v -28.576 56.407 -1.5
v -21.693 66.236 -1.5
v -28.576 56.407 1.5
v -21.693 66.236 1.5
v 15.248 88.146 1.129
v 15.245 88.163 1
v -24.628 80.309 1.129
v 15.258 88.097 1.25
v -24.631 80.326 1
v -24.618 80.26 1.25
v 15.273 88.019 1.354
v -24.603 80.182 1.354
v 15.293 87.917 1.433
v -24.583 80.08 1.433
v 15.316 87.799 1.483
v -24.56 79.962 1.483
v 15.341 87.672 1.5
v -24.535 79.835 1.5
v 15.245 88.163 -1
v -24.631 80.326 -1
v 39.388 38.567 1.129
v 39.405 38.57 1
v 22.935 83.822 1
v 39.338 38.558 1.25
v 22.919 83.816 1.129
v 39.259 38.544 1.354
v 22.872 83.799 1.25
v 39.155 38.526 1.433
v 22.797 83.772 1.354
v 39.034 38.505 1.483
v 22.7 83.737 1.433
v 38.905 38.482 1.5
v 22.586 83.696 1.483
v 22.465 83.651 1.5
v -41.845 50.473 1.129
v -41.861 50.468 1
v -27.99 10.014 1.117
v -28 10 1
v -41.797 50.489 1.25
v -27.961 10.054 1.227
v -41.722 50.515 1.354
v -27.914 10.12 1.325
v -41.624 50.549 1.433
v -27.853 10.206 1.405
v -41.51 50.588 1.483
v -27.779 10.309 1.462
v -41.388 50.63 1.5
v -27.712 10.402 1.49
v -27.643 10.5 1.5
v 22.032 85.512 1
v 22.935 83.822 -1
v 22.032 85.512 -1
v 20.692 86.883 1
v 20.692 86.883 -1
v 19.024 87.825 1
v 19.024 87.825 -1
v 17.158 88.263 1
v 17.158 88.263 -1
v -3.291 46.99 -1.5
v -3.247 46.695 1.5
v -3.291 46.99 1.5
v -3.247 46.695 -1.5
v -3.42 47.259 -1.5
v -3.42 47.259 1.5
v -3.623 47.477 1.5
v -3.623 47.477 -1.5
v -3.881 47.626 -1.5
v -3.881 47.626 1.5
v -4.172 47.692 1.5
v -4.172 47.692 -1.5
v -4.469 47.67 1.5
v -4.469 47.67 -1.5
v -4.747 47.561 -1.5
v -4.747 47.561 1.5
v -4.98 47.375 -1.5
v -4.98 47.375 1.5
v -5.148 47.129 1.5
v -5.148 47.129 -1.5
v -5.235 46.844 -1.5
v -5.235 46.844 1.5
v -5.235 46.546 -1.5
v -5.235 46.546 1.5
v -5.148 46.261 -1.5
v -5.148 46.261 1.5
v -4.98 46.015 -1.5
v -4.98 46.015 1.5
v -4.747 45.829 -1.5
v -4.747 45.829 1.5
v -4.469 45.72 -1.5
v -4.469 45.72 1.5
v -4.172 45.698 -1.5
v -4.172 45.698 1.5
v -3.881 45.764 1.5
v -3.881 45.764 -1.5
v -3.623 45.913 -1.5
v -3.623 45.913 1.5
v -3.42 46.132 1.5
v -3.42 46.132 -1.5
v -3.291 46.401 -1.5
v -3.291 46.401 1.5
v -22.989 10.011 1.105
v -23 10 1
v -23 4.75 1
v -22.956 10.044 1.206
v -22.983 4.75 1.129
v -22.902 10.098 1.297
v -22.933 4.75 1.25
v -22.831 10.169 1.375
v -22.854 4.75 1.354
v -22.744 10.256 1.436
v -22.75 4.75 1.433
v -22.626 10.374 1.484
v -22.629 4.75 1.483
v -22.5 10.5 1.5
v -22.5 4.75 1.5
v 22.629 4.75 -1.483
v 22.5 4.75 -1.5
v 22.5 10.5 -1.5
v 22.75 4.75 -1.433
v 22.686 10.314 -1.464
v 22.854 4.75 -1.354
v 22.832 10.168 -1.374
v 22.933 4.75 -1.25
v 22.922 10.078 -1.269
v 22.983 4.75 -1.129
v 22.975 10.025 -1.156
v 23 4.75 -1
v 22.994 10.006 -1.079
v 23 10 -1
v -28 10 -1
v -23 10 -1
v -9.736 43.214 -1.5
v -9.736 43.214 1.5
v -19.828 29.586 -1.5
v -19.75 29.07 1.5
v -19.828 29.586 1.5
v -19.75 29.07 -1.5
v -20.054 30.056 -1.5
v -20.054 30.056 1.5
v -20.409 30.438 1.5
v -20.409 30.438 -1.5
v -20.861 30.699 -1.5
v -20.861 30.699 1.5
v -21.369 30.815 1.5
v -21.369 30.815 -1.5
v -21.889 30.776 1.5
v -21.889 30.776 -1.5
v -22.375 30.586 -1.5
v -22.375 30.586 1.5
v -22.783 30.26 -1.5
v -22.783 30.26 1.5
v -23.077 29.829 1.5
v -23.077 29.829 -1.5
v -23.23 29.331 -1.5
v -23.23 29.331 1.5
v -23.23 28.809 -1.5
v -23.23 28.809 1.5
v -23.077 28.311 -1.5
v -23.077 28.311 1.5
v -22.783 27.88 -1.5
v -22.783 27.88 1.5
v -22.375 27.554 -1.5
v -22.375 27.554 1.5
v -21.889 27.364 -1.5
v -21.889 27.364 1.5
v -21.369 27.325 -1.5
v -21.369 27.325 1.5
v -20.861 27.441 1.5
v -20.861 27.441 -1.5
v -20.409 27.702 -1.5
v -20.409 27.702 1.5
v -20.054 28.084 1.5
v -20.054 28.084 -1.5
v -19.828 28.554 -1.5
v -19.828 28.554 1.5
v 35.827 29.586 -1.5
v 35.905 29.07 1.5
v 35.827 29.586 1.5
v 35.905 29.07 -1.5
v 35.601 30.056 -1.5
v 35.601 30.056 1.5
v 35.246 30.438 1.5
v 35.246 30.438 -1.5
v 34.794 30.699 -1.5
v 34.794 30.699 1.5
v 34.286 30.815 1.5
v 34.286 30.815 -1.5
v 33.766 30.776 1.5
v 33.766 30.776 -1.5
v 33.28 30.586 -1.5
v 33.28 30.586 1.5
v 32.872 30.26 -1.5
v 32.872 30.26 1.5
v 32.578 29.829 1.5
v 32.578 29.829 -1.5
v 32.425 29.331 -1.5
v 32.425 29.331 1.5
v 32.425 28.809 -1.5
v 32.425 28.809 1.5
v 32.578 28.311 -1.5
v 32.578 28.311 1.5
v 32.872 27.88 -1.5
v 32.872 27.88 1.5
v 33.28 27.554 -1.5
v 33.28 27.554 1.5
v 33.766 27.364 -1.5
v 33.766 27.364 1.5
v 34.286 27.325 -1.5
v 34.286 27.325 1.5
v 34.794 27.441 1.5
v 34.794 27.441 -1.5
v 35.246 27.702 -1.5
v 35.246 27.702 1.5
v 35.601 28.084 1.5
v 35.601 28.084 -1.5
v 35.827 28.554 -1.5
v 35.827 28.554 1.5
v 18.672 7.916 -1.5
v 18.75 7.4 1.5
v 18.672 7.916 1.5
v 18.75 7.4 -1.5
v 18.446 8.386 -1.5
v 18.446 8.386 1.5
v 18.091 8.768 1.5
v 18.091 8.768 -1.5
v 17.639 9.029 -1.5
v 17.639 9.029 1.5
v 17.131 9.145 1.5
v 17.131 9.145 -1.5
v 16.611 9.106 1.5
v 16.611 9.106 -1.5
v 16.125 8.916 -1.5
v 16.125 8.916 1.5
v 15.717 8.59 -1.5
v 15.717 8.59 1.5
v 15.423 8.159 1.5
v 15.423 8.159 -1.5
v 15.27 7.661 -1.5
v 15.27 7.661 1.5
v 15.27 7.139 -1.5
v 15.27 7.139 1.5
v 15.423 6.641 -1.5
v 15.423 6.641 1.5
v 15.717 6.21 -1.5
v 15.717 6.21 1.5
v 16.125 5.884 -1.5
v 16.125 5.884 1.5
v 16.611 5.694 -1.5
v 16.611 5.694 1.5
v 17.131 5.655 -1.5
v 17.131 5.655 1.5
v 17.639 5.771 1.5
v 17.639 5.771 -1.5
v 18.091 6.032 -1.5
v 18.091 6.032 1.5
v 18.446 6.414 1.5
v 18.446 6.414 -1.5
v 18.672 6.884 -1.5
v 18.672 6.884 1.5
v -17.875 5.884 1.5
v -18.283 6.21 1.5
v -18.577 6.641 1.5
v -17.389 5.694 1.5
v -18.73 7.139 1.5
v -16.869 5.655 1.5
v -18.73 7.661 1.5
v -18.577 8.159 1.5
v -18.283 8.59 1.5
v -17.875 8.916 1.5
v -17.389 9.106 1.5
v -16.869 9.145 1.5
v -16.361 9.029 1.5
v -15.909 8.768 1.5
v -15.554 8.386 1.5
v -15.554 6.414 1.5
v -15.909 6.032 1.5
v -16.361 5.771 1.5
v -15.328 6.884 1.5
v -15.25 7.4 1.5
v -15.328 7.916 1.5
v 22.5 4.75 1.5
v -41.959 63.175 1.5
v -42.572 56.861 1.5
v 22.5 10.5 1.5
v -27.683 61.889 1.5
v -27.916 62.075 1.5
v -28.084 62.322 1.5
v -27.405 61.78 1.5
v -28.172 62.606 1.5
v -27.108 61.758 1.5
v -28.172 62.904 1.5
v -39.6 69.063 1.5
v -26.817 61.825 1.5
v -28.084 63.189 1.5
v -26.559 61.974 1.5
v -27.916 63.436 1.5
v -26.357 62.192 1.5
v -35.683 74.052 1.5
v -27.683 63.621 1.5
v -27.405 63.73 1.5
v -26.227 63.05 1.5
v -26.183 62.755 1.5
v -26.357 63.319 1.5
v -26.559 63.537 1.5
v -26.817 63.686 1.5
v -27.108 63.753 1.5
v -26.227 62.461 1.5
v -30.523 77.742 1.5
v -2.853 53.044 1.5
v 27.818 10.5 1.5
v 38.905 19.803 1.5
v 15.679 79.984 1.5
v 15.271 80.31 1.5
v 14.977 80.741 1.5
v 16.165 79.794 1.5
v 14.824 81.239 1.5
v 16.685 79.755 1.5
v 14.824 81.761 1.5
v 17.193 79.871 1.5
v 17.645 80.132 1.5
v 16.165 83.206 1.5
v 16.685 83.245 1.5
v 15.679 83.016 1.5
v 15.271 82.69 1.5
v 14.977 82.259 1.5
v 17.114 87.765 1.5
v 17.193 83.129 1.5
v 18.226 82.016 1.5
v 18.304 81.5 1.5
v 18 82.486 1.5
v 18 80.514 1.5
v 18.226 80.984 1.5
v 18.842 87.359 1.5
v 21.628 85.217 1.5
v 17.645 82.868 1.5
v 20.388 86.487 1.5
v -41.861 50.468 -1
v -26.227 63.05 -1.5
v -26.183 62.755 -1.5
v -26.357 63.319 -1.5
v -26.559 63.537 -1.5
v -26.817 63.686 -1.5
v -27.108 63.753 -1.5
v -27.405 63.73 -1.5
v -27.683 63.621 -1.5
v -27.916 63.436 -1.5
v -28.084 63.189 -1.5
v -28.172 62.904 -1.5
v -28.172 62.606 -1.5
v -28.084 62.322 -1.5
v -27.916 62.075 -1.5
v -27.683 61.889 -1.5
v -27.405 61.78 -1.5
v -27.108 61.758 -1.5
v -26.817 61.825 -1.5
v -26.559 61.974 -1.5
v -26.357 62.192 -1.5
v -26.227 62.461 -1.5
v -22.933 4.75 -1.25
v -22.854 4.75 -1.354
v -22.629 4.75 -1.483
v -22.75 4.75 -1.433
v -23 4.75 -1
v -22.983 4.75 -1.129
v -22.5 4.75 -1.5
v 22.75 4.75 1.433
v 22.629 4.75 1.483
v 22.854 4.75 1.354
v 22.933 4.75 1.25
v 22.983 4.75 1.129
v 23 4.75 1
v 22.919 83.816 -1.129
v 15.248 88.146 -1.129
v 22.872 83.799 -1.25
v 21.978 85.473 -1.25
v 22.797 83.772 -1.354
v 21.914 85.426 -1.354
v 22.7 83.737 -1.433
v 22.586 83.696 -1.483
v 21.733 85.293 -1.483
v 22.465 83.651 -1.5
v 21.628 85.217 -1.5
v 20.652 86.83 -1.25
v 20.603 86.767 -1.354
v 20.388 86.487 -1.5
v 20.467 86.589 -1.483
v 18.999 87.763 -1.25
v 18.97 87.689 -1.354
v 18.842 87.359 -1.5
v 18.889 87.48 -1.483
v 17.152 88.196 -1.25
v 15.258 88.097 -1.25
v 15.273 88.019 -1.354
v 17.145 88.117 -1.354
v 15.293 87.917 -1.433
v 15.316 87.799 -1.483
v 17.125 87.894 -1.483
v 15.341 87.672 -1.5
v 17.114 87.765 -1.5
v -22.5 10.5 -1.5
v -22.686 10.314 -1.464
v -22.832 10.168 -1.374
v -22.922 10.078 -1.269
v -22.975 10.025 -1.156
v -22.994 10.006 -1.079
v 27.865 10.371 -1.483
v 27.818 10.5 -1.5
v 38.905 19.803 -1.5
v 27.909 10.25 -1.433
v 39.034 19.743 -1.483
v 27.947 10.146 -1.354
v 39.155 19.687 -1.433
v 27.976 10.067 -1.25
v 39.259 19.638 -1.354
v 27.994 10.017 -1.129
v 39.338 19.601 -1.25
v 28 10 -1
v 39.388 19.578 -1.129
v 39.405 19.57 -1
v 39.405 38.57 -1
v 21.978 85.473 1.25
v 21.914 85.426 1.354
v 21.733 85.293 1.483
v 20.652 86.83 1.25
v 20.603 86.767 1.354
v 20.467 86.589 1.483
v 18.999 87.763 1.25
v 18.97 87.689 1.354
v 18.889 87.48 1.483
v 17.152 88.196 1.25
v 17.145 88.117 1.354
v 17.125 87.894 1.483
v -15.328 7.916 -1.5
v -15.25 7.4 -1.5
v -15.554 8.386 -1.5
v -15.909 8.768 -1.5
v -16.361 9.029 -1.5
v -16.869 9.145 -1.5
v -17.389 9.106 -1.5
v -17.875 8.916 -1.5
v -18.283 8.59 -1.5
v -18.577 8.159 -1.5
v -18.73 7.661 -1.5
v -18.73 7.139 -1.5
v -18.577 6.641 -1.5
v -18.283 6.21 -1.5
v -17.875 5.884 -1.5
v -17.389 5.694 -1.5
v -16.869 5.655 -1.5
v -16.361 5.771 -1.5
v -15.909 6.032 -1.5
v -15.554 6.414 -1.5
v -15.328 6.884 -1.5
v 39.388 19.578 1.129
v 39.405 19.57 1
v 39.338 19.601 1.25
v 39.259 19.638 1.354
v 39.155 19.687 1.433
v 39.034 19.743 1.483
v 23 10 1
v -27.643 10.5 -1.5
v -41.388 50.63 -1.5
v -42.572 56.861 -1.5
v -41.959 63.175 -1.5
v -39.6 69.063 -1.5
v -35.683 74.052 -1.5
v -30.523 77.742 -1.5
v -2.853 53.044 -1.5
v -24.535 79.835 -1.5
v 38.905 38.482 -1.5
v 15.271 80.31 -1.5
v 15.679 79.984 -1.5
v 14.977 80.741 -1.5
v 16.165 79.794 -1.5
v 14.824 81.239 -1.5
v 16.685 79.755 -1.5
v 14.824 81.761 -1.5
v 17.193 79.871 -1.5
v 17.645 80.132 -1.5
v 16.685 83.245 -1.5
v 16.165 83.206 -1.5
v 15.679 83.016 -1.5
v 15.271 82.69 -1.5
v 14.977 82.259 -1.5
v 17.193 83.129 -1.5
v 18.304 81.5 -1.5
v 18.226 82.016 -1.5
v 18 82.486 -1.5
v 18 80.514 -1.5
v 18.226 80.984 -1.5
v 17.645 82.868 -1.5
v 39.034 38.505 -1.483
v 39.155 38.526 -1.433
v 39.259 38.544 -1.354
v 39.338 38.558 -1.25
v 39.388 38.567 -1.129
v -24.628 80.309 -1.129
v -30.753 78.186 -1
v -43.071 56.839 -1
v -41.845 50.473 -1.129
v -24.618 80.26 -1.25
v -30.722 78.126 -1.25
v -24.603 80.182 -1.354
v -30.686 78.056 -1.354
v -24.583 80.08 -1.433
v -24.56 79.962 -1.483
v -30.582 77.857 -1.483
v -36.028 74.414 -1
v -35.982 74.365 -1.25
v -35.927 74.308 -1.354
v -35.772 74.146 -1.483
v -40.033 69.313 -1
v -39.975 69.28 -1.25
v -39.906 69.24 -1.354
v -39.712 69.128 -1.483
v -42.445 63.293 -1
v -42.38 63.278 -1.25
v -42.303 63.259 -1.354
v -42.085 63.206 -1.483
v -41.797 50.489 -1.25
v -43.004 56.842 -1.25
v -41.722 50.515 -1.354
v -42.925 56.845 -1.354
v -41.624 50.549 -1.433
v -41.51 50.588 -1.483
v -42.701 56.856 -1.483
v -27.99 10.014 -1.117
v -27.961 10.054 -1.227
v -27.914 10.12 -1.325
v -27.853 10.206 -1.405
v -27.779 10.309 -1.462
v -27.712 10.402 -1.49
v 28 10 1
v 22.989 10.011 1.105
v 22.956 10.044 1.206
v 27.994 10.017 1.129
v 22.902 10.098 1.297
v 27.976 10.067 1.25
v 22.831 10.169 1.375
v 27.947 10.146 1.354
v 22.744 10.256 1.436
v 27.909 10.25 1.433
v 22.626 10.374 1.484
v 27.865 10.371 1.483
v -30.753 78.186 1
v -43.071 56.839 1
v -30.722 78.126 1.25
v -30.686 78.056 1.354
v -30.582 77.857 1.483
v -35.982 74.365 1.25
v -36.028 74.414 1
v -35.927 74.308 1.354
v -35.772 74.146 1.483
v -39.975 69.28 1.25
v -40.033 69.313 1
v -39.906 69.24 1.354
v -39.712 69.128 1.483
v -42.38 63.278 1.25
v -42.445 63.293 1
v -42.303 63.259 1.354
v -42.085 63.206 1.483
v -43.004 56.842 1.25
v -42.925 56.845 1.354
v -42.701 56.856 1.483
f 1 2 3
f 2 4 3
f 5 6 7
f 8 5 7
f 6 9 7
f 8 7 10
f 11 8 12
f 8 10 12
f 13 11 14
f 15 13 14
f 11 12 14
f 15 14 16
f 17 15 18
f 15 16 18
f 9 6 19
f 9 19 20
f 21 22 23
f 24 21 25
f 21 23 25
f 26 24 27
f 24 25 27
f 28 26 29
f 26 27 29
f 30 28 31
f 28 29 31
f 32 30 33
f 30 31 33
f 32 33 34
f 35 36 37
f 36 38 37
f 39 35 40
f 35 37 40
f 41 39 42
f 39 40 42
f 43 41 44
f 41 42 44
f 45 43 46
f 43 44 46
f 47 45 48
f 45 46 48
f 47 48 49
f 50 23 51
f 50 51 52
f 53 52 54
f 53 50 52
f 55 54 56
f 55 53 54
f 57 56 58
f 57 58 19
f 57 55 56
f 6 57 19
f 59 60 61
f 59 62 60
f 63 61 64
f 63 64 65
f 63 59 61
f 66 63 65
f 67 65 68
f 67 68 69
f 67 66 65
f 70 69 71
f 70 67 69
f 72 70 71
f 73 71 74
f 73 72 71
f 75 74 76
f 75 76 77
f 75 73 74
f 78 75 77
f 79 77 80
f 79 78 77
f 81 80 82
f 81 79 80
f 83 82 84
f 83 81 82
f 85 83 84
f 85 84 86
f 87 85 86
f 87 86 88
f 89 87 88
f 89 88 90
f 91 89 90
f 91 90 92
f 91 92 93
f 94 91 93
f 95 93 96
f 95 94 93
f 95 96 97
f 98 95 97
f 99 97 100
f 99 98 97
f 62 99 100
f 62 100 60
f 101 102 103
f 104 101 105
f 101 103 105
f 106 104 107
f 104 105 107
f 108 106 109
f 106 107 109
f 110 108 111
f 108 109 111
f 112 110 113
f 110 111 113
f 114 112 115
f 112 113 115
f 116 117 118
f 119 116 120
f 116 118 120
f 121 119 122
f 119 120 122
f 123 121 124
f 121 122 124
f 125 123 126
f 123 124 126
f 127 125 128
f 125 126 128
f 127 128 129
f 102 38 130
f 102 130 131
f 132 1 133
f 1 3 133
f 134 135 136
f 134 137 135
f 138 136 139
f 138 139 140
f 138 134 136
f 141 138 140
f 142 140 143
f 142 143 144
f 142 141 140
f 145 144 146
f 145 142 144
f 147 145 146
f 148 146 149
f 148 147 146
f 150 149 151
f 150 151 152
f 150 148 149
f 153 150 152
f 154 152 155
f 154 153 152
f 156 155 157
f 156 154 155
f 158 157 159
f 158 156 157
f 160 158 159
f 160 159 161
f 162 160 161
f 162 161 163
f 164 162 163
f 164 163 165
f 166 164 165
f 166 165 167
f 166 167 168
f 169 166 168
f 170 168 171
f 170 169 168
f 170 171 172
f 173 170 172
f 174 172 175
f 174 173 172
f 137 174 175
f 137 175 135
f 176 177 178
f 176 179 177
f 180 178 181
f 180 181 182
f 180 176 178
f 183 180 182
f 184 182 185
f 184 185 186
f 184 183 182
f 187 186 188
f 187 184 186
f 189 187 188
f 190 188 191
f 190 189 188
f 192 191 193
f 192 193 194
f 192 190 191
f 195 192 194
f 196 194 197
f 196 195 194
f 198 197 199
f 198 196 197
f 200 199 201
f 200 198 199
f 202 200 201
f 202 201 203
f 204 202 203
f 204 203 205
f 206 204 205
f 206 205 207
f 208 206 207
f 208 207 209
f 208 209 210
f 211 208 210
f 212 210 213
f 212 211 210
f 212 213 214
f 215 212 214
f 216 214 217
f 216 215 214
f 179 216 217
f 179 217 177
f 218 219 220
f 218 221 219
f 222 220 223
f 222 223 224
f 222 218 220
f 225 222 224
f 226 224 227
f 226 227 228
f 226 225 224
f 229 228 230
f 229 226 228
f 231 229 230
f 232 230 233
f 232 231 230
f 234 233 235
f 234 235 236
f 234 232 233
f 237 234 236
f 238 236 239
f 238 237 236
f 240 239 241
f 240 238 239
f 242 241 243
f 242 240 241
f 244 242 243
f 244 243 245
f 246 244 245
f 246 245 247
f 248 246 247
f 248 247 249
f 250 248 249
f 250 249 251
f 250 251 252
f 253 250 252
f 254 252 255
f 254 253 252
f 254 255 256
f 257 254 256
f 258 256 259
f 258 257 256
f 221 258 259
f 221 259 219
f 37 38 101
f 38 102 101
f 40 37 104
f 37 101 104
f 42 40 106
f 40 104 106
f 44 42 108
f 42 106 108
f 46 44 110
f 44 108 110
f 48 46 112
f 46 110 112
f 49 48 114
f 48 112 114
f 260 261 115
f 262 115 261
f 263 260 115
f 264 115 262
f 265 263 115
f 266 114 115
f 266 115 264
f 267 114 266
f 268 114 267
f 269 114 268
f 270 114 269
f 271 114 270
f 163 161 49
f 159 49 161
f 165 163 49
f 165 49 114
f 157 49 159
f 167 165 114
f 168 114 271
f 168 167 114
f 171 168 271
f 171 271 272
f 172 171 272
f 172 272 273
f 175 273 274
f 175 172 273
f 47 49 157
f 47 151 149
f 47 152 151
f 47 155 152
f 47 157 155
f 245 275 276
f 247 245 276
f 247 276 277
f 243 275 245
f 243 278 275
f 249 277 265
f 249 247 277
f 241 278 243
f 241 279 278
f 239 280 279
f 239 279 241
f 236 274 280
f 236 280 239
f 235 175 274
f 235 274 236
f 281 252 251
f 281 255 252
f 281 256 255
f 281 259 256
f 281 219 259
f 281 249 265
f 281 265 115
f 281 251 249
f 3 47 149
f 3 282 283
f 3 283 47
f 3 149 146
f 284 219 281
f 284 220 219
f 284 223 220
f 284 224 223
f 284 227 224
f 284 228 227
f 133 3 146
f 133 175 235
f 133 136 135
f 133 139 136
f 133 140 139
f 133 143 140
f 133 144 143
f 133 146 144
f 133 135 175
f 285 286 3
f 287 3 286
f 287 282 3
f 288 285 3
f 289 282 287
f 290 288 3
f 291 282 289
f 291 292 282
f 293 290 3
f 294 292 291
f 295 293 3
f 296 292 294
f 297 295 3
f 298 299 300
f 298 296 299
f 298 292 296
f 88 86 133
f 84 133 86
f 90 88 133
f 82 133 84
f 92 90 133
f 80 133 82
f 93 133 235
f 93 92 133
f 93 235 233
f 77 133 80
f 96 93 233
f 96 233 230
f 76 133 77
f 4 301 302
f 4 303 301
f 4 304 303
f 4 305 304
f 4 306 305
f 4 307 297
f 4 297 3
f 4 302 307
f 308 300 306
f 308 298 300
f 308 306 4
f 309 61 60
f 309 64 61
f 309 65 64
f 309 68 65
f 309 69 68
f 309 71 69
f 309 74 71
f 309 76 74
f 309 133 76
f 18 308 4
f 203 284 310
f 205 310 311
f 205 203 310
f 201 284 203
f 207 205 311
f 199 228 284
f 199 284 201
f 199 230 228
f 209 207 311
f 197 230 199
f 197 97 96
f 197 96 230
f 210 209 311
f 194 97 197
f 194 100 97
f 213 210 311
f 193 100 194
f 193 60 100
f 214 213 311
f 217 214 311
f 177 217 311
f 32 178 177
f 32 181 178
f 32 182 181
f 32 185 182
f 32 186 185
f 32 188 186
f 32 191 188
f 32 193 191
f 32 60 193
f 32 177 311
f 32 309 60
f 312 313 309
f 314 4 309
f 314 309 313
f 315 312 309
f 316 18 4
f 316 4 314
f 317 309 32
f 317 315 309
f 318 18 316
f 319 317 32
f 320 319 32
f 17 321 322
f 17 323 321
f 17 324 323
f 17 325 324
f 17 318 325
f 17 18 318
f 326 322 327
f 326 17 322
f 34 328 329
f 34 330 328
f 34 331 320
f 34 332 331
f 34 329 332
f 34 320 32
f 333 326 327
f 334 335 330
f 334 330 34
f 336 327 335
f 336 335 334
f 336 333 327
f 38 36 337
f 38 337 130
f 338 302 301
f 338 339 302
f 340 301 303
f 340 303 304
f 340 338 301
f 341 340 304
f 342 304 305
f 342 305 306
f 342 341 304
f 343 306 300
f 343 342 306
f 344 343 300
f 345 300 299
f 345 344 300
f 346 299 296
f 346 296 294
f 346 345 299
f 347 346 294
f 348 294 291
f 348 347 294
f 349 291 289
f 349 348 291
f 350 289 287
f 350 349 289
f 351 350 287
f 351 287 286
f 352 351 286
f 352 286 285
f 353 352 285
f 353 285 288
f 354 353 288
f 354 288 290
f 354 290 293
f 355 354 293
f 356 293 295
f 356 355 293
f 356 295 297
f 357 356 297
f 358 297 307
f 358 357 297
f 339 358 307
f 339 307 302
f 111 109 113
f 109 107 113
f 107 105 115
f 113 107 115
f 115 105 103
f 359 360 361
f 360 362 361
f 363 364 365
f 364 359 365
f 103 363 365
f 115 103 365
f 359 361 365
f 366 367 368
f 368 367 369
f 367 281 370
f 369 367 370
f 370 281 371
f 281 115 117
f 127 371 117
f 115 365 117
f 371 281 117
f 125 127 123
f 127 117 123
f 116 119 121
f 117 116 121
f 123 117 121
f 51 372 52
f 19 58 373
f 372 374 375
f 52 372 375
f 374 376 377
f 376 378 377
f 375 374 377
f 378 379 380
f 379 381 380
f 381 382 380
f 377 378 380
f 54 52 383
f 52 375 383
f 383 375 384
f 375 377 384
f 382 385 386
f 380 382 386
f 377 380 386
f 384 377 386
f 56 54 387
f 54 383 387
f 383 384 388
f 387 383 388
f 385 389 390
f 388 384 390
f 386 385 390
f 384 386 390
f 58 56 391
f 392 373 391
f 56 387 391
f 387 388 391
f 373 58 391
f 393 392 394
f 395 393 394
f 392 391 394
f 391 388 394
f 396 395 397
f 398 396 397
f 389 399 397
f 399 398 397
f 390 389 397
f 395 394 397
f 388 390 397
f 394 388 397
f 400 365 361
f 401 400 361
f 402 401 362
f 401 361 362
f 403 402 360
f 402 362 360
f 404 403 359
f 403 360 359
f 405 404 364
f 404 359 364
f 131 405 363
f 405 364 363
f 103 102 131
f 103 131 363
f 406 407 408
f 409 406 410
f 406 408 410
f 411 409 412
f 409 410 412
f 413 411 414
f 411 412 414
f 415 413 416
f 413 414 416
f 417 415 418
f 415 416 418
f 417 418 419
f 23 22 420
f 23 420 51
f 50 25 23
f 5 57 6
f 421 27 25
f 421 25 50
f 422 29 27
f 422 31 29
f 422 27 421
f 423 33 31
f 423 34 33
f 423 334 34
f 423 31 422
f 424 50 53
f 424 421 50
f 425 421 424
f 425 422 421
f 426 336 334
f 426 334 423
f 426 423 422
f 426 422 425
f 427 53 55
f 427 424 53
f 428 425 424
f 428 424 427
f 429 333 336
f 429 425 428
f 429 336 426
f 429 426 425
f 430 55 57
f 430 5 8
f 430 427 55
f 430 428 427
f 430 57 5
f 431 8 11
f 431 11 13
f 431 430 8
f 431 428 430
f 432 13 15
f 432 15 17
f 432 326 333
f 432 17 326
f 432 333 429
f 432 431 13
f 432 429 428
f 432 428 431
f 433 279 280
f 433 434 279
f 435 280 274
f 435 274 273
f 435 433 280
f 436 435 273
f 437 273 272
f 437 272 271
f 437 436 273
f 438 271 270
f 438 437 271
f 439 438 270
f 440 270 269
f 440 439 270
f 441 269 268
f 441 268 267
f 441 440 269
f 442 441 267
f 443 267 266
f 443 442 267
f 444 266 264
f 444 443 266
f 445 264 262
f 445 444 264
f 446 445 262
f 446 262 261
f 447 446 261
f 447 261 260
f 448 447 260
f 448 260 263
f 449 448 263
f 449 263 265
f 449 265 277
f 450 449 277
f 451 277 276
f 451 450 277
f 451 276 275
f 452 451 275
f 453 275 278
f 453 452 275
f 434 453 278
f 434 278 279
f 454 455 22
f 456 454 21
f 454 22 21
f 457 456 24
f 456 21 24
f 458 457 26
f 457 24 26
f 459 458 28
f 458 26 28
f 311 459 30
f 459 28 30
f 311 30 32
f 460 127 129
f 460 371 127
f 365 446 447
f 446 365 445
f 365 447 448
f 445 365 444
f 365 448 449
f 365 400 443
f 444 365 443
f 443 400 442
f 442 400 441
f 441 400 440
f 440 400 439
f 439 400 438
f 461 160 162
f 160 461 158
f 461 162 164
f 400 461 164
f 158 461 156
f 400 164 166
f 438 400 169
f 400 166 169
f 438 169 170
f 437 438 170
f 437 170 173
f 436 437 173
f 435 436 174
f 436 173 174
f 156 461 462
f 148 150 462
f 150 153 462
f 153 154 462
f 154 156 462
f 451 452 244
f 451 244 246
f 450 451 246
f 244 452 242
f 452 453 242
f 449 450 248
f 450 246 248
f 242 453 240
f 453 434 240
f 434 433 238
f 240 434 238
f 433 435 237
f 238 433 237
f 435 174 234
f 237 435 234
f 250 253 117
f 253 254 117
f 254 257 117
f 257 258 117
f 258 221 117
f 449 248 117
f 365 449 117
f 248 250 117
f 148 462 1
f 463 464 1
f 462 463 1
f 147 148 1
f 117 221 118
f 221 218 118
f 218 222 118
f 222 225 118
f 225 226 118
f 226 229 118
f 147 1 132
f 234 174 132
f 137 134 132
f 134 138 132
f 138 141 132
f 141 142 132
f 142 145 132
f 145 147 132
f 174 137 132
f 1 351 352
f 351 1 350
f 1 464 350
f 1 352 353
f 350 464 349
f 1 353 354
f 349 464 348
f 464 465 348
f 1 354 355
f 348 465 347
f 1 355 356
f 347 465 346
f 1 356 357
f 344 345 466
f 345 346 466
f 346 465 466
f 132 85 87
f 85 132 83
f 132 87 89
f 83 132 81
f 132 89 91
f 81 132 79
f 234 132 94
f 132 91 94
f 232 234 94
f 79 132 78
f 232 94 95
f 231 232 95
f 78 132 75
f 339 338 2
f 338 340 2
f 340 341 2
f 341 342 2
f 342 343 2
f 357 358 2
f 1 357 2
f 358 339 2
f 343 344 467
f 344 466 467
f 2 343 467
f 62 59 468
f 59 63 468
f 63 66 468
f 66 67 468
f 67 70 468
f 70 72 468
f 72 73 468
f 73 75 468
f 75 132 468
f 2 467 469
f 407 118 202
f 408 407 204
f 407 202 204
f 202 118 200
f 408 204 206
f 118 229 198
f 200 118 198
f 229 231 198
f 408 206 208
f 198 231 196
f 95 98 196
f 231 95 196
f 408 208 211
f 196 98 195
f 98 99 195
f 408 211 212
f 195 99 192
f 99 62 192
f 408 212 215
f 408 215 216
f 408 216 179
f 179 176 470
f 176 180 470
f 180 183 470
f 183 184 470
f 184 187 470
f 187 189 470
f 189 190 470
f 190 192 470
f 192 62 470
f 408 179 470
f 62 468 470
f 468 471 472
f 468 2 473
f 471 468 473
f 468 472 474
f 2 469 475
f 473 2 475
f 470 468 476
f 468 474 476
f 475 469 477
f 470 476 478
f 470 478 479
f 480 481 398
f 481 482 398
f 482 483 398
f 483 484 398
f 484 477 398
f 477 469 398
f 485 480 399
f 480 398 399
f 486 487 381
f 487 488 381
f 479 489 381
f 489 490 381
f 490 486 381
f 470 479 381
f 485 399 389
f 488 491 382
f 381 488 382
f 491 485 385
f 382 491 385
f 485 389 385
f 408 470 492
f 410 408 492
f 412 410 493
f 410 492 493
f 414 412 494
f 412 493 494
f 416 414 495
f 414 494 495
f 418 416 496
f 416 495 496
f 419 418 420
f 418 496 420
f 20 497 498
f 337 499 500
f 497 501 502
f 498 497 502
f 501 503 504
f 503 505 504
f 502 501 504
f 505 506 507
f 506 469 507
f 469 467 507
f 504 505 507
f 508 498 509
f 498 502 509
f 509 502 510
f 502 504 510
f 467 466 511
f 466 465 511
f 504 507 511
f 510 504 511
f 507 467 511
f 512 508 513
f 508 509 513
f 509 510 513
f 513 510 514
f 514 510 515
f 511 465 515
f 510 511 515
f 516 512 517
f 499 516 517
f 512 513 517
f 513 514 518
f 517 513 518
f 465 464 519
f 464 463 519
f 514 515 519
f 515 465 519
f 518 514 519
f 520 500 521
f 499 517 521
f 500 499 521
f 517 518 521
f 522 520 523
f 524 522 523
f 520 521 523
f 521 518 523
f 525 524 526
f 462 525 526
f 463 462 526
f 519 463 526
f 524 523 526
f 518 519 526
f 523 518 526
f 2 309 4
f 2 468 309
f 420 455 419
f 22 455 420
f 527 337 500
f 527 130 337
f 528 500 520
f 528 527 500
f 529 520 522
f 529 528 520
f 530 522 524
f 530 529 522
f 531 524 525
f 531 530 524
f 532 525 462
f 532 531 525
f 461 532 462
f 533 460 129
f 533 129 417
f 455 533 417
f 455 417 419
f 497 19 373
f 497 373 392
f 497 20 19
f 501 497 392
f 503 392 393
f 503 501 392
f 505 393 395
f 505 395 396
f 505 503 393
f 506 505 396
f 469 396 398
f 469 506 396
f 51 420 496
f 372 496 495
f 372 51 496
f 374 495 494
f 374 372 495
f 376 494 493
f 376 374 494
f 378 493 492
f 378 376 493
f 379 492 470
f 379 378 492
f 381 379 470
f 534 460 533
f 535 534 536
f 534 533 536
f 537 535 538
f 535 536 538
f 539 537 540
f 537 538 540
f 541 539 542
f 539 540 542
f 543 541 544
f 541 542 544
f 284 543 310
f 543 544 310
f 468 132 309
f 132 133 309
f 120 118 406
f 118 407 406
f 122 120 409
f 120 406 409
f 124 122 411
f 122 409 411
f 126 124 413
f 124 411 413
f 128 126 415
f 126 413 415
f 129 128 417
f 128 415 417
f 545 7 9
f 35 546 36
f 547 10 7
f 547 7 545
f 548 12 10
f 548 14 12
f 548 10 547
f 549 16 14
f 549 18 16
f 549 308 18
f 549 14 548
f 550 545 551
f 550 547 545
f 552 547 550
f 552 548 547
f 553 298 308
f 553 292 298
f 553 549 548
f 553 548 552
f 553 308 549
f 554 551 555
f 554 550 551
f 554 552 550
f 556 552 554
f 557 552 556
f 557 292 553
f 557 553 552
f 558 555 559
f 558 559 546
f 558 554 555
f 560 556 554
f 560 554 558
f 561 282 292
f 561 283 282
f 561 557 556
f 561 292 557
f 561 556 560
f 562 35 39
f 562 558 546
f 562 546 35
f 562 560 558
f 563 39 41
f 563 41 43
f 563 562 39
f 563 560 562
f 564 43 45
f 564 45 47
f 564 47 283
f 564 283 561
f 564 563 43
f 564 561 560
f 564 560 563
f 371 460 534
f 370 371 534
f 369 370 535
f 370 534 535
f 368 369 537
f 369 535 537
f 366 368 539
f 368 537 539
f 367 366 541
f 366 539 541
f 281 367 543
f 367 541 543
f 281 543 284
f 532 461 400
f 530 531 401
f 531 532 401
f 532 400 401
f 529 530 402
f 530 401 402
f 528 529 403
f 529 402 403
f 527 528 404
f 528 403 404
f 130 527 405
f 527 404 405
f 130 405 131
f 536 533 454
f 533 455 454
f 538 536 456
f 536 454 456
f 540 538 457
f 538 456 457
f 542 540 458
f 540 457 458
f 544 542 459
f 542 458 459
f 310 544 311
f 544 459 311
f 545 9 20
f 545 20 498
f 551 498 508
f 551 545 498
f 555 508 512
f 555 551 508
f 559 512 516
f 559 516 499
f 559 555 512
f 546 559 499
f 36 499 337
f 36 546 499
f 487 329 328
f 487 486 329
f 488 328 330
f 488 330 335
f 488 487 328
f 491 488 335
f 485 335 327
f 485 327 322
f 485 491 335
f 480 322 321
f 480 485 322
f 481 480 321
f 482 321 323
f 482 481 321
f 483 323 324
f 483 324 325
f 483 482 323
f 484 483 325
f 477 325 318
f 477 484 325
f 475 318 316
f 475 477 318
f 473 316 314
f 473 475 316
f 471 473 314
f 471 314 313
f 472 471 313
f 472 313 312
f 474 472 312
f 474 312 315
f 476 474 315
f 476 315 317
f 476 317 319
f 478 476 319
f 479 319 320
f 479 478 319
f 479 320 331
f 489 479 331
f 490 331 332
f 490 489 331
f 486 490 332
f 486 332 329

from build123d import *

# Parameters (mm, degrees)
SKETCH2_R               = 1
SKETCH2_R_2             = 1.75
BOSS_EXTRUDE1_DEPTH     = 1.5
FILLET1_R               = 0.5
FILLET2_R               = 0.5
CUT_EXTRUDE1_DEPTH      = 99.29192821
CUT_EXTRUDE1_DEPTH_BACK = 99.29192821
SKETCH3_W               = 46
SKETCH3_H               = 4.75


with BuildPart() as part:
    # Sketch2 → Boss-Extrude1 (new, symmetric)
    with BuildSketch(Plane.XY):
        with BuildLine():
            Line((39.405069621, 38.569989712), (22.934569539, 83.822316773))
            ThreePointArc((22.934569539, 83.822316773), (19.891485129, 87.41317775), (15.244648683, 88.162548371))
            Line((15.244648683, 88.162548371), (-24.631297069, 80.325625034))
            ThreePointArc((-24.631297069, 80.325625034), (-40.032912198, 69.313028262), (-41.860786126, 50.467712846))
            Line((-41.860786126, 50.467712846), (-28, 10))
            Line((-28, 10), (-23, 10))
            Line((-23, 10), (-23, 0))
            Line((-23, 0), (23, 0))
            Line((23, 0), (23, 10))
            Line((23, 10), (28, 10))
            Line((28, 10), (39.405069621, 19.569989712))
            Line((39.405069621, 19.569989712), (39.405069621, 38.569989712))
        make_face()
        with Locations((-27.182792376, 62.755399709)):
            Circle(SKETCH2_R, mode=Mode.SUBTRACT)
        with Locations((-4.246535136, 46.695259491)):
            Circle(SKETCH2_R, mode=Mode.SUBTRACT)
        with Locations((17, 7.4)):
            Circle(SKETCH2_R_2, mode=Mode.SUBTRACT)
        with Locations((-17, 7.4)):
            Circle(SKETCH2_R_2, mode=Mode.SUBTRACT)
        with Locations((34.155069621, 29.069989712)):
            Circle(SKETCH2_R_2, mode=Mode.SUBTRACT)
        with Locations((-21.5, 29.069989712)):
            Circle(SKETCH2_R_2, mode=Mode.SUBTRACT)
        with Locations((16.554056644, 81.5)):
            Circle(SKETCH2_R_2, mode=Mode.SUBTRACT)
        Polygon((-21.693453648, 66.236370884), (-28.576370884, 56.406546352), (-9.735873865, 43.214288316), (-2.852956629, 53.044112848), align=None, mode=Mode.SUBTRACT)
    extrude(amount=BOSS_EXTRUDE1_DEPTH, both=True)

    # Fillet1
    fillet1_edges = [part.edges().sort_by_distance(p)[0] for p in [
        (-40.032912198, 69.313028262, 1.5),
        (-34.930393063, 30.233856423, 1.5),
        (-25.5, 10, 1.5),
        (-23, 5, 1.5),
        (0, 0, 1.5),
        (23, 5, 1.5),
        (25.5, 10, 1.5),
        (33.70253481, 14.784994856, 1.5),
        (39.405069621, 29.069989712, 1.5),
        (31.16981958, 61.196153243, 1.5),
        (19.891485129, 87.41317775, 1.5),
        (-4.693324193, 84.244086702, 1.5),
    ]]
    fillet(fillet1_edges, radius=FILLET1_R)

    # Fillet2
    fillet2_edges = [part.edges().sort_by_distance(p)[0] for p in [
        (31.16981958, 61.196153243, -1.5),
        (39.405069621, 29.069989712, -1.5),
        (33.70253481, 14.784994856, -1.5),
        (25.5, 10, -1.5),
        (23, 5, -1.5),
        (0, 0, -1.5),
        (-23, 5, -1.5),
        (-25.5, 10, -1.5),
        (-34.930393063, 30.233856423, -1.5),
        (-40.032912198, 69.313028262, -1.5),
        (-4.693324193, 84.244086702, -1.5),
        (19.891485129, 87.41317775, -1.5),
    ]]
    fillet(fillet2_edges, radius=FILLET2_R)

    # Sketch3 → Cut-Extrude1 (cut, two sides: drawn at the far end of the back side and taken through both)
    with BuildSketch(Plane.XY.offset(1.5).offset(-CUT_EXTRUDE1_DEPTH_BACK)):
        with Locations((0, 2.375)):
            Rectangle(SKETCH3_W, SKETCH3_H)
    extrude(amount=CUT_EXTRUDE1_DEPTH + CUT_EXTRUDE1_DEPTH_BACK, mode=Mode.SUBTRACT)


solid = part.part
